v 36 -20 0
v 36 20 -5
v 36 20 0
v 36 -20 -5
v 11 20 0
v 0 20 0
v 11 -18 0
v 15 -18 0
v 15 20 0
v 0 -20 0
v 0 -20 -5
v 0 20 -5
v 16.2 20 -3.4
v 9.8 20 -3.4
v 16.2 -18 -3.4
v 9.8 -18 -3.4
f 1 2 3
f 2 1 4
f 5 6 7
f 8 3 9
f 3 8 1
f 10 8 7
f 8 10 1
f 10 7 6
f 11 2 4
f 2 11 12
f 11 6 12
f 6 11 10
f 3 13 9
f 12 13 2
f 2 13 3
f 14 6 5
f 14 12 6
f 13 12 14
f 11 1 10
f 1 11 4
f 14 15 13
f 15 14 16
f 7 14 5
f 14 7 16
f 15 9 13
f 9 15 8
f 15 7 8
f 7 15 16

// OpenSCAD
module clinger_no_blocker() {
    difference() {
        // 36 = 4 6 
        translate([0,-20,-5]) cube([36, 40, 5]);
        translate([13,0,-3.4]) 
            linear_extrude(height=3.4, scale=[4/6.4,1]) 
                square([6.4, 40], center=true);
    }
}

module clinger_with_blocker() {
    difference() {
        // 36 = 4 6 
        translate([0,-20,-5]) cube([36, 40, 5]);
        translate([13,2,-3.4]) 
            linear_extrude(height=3.4, scale=[4/6.4,1]) 
                square([6.4, 40], center=true);
    }
}

clinger_with_blocker();
